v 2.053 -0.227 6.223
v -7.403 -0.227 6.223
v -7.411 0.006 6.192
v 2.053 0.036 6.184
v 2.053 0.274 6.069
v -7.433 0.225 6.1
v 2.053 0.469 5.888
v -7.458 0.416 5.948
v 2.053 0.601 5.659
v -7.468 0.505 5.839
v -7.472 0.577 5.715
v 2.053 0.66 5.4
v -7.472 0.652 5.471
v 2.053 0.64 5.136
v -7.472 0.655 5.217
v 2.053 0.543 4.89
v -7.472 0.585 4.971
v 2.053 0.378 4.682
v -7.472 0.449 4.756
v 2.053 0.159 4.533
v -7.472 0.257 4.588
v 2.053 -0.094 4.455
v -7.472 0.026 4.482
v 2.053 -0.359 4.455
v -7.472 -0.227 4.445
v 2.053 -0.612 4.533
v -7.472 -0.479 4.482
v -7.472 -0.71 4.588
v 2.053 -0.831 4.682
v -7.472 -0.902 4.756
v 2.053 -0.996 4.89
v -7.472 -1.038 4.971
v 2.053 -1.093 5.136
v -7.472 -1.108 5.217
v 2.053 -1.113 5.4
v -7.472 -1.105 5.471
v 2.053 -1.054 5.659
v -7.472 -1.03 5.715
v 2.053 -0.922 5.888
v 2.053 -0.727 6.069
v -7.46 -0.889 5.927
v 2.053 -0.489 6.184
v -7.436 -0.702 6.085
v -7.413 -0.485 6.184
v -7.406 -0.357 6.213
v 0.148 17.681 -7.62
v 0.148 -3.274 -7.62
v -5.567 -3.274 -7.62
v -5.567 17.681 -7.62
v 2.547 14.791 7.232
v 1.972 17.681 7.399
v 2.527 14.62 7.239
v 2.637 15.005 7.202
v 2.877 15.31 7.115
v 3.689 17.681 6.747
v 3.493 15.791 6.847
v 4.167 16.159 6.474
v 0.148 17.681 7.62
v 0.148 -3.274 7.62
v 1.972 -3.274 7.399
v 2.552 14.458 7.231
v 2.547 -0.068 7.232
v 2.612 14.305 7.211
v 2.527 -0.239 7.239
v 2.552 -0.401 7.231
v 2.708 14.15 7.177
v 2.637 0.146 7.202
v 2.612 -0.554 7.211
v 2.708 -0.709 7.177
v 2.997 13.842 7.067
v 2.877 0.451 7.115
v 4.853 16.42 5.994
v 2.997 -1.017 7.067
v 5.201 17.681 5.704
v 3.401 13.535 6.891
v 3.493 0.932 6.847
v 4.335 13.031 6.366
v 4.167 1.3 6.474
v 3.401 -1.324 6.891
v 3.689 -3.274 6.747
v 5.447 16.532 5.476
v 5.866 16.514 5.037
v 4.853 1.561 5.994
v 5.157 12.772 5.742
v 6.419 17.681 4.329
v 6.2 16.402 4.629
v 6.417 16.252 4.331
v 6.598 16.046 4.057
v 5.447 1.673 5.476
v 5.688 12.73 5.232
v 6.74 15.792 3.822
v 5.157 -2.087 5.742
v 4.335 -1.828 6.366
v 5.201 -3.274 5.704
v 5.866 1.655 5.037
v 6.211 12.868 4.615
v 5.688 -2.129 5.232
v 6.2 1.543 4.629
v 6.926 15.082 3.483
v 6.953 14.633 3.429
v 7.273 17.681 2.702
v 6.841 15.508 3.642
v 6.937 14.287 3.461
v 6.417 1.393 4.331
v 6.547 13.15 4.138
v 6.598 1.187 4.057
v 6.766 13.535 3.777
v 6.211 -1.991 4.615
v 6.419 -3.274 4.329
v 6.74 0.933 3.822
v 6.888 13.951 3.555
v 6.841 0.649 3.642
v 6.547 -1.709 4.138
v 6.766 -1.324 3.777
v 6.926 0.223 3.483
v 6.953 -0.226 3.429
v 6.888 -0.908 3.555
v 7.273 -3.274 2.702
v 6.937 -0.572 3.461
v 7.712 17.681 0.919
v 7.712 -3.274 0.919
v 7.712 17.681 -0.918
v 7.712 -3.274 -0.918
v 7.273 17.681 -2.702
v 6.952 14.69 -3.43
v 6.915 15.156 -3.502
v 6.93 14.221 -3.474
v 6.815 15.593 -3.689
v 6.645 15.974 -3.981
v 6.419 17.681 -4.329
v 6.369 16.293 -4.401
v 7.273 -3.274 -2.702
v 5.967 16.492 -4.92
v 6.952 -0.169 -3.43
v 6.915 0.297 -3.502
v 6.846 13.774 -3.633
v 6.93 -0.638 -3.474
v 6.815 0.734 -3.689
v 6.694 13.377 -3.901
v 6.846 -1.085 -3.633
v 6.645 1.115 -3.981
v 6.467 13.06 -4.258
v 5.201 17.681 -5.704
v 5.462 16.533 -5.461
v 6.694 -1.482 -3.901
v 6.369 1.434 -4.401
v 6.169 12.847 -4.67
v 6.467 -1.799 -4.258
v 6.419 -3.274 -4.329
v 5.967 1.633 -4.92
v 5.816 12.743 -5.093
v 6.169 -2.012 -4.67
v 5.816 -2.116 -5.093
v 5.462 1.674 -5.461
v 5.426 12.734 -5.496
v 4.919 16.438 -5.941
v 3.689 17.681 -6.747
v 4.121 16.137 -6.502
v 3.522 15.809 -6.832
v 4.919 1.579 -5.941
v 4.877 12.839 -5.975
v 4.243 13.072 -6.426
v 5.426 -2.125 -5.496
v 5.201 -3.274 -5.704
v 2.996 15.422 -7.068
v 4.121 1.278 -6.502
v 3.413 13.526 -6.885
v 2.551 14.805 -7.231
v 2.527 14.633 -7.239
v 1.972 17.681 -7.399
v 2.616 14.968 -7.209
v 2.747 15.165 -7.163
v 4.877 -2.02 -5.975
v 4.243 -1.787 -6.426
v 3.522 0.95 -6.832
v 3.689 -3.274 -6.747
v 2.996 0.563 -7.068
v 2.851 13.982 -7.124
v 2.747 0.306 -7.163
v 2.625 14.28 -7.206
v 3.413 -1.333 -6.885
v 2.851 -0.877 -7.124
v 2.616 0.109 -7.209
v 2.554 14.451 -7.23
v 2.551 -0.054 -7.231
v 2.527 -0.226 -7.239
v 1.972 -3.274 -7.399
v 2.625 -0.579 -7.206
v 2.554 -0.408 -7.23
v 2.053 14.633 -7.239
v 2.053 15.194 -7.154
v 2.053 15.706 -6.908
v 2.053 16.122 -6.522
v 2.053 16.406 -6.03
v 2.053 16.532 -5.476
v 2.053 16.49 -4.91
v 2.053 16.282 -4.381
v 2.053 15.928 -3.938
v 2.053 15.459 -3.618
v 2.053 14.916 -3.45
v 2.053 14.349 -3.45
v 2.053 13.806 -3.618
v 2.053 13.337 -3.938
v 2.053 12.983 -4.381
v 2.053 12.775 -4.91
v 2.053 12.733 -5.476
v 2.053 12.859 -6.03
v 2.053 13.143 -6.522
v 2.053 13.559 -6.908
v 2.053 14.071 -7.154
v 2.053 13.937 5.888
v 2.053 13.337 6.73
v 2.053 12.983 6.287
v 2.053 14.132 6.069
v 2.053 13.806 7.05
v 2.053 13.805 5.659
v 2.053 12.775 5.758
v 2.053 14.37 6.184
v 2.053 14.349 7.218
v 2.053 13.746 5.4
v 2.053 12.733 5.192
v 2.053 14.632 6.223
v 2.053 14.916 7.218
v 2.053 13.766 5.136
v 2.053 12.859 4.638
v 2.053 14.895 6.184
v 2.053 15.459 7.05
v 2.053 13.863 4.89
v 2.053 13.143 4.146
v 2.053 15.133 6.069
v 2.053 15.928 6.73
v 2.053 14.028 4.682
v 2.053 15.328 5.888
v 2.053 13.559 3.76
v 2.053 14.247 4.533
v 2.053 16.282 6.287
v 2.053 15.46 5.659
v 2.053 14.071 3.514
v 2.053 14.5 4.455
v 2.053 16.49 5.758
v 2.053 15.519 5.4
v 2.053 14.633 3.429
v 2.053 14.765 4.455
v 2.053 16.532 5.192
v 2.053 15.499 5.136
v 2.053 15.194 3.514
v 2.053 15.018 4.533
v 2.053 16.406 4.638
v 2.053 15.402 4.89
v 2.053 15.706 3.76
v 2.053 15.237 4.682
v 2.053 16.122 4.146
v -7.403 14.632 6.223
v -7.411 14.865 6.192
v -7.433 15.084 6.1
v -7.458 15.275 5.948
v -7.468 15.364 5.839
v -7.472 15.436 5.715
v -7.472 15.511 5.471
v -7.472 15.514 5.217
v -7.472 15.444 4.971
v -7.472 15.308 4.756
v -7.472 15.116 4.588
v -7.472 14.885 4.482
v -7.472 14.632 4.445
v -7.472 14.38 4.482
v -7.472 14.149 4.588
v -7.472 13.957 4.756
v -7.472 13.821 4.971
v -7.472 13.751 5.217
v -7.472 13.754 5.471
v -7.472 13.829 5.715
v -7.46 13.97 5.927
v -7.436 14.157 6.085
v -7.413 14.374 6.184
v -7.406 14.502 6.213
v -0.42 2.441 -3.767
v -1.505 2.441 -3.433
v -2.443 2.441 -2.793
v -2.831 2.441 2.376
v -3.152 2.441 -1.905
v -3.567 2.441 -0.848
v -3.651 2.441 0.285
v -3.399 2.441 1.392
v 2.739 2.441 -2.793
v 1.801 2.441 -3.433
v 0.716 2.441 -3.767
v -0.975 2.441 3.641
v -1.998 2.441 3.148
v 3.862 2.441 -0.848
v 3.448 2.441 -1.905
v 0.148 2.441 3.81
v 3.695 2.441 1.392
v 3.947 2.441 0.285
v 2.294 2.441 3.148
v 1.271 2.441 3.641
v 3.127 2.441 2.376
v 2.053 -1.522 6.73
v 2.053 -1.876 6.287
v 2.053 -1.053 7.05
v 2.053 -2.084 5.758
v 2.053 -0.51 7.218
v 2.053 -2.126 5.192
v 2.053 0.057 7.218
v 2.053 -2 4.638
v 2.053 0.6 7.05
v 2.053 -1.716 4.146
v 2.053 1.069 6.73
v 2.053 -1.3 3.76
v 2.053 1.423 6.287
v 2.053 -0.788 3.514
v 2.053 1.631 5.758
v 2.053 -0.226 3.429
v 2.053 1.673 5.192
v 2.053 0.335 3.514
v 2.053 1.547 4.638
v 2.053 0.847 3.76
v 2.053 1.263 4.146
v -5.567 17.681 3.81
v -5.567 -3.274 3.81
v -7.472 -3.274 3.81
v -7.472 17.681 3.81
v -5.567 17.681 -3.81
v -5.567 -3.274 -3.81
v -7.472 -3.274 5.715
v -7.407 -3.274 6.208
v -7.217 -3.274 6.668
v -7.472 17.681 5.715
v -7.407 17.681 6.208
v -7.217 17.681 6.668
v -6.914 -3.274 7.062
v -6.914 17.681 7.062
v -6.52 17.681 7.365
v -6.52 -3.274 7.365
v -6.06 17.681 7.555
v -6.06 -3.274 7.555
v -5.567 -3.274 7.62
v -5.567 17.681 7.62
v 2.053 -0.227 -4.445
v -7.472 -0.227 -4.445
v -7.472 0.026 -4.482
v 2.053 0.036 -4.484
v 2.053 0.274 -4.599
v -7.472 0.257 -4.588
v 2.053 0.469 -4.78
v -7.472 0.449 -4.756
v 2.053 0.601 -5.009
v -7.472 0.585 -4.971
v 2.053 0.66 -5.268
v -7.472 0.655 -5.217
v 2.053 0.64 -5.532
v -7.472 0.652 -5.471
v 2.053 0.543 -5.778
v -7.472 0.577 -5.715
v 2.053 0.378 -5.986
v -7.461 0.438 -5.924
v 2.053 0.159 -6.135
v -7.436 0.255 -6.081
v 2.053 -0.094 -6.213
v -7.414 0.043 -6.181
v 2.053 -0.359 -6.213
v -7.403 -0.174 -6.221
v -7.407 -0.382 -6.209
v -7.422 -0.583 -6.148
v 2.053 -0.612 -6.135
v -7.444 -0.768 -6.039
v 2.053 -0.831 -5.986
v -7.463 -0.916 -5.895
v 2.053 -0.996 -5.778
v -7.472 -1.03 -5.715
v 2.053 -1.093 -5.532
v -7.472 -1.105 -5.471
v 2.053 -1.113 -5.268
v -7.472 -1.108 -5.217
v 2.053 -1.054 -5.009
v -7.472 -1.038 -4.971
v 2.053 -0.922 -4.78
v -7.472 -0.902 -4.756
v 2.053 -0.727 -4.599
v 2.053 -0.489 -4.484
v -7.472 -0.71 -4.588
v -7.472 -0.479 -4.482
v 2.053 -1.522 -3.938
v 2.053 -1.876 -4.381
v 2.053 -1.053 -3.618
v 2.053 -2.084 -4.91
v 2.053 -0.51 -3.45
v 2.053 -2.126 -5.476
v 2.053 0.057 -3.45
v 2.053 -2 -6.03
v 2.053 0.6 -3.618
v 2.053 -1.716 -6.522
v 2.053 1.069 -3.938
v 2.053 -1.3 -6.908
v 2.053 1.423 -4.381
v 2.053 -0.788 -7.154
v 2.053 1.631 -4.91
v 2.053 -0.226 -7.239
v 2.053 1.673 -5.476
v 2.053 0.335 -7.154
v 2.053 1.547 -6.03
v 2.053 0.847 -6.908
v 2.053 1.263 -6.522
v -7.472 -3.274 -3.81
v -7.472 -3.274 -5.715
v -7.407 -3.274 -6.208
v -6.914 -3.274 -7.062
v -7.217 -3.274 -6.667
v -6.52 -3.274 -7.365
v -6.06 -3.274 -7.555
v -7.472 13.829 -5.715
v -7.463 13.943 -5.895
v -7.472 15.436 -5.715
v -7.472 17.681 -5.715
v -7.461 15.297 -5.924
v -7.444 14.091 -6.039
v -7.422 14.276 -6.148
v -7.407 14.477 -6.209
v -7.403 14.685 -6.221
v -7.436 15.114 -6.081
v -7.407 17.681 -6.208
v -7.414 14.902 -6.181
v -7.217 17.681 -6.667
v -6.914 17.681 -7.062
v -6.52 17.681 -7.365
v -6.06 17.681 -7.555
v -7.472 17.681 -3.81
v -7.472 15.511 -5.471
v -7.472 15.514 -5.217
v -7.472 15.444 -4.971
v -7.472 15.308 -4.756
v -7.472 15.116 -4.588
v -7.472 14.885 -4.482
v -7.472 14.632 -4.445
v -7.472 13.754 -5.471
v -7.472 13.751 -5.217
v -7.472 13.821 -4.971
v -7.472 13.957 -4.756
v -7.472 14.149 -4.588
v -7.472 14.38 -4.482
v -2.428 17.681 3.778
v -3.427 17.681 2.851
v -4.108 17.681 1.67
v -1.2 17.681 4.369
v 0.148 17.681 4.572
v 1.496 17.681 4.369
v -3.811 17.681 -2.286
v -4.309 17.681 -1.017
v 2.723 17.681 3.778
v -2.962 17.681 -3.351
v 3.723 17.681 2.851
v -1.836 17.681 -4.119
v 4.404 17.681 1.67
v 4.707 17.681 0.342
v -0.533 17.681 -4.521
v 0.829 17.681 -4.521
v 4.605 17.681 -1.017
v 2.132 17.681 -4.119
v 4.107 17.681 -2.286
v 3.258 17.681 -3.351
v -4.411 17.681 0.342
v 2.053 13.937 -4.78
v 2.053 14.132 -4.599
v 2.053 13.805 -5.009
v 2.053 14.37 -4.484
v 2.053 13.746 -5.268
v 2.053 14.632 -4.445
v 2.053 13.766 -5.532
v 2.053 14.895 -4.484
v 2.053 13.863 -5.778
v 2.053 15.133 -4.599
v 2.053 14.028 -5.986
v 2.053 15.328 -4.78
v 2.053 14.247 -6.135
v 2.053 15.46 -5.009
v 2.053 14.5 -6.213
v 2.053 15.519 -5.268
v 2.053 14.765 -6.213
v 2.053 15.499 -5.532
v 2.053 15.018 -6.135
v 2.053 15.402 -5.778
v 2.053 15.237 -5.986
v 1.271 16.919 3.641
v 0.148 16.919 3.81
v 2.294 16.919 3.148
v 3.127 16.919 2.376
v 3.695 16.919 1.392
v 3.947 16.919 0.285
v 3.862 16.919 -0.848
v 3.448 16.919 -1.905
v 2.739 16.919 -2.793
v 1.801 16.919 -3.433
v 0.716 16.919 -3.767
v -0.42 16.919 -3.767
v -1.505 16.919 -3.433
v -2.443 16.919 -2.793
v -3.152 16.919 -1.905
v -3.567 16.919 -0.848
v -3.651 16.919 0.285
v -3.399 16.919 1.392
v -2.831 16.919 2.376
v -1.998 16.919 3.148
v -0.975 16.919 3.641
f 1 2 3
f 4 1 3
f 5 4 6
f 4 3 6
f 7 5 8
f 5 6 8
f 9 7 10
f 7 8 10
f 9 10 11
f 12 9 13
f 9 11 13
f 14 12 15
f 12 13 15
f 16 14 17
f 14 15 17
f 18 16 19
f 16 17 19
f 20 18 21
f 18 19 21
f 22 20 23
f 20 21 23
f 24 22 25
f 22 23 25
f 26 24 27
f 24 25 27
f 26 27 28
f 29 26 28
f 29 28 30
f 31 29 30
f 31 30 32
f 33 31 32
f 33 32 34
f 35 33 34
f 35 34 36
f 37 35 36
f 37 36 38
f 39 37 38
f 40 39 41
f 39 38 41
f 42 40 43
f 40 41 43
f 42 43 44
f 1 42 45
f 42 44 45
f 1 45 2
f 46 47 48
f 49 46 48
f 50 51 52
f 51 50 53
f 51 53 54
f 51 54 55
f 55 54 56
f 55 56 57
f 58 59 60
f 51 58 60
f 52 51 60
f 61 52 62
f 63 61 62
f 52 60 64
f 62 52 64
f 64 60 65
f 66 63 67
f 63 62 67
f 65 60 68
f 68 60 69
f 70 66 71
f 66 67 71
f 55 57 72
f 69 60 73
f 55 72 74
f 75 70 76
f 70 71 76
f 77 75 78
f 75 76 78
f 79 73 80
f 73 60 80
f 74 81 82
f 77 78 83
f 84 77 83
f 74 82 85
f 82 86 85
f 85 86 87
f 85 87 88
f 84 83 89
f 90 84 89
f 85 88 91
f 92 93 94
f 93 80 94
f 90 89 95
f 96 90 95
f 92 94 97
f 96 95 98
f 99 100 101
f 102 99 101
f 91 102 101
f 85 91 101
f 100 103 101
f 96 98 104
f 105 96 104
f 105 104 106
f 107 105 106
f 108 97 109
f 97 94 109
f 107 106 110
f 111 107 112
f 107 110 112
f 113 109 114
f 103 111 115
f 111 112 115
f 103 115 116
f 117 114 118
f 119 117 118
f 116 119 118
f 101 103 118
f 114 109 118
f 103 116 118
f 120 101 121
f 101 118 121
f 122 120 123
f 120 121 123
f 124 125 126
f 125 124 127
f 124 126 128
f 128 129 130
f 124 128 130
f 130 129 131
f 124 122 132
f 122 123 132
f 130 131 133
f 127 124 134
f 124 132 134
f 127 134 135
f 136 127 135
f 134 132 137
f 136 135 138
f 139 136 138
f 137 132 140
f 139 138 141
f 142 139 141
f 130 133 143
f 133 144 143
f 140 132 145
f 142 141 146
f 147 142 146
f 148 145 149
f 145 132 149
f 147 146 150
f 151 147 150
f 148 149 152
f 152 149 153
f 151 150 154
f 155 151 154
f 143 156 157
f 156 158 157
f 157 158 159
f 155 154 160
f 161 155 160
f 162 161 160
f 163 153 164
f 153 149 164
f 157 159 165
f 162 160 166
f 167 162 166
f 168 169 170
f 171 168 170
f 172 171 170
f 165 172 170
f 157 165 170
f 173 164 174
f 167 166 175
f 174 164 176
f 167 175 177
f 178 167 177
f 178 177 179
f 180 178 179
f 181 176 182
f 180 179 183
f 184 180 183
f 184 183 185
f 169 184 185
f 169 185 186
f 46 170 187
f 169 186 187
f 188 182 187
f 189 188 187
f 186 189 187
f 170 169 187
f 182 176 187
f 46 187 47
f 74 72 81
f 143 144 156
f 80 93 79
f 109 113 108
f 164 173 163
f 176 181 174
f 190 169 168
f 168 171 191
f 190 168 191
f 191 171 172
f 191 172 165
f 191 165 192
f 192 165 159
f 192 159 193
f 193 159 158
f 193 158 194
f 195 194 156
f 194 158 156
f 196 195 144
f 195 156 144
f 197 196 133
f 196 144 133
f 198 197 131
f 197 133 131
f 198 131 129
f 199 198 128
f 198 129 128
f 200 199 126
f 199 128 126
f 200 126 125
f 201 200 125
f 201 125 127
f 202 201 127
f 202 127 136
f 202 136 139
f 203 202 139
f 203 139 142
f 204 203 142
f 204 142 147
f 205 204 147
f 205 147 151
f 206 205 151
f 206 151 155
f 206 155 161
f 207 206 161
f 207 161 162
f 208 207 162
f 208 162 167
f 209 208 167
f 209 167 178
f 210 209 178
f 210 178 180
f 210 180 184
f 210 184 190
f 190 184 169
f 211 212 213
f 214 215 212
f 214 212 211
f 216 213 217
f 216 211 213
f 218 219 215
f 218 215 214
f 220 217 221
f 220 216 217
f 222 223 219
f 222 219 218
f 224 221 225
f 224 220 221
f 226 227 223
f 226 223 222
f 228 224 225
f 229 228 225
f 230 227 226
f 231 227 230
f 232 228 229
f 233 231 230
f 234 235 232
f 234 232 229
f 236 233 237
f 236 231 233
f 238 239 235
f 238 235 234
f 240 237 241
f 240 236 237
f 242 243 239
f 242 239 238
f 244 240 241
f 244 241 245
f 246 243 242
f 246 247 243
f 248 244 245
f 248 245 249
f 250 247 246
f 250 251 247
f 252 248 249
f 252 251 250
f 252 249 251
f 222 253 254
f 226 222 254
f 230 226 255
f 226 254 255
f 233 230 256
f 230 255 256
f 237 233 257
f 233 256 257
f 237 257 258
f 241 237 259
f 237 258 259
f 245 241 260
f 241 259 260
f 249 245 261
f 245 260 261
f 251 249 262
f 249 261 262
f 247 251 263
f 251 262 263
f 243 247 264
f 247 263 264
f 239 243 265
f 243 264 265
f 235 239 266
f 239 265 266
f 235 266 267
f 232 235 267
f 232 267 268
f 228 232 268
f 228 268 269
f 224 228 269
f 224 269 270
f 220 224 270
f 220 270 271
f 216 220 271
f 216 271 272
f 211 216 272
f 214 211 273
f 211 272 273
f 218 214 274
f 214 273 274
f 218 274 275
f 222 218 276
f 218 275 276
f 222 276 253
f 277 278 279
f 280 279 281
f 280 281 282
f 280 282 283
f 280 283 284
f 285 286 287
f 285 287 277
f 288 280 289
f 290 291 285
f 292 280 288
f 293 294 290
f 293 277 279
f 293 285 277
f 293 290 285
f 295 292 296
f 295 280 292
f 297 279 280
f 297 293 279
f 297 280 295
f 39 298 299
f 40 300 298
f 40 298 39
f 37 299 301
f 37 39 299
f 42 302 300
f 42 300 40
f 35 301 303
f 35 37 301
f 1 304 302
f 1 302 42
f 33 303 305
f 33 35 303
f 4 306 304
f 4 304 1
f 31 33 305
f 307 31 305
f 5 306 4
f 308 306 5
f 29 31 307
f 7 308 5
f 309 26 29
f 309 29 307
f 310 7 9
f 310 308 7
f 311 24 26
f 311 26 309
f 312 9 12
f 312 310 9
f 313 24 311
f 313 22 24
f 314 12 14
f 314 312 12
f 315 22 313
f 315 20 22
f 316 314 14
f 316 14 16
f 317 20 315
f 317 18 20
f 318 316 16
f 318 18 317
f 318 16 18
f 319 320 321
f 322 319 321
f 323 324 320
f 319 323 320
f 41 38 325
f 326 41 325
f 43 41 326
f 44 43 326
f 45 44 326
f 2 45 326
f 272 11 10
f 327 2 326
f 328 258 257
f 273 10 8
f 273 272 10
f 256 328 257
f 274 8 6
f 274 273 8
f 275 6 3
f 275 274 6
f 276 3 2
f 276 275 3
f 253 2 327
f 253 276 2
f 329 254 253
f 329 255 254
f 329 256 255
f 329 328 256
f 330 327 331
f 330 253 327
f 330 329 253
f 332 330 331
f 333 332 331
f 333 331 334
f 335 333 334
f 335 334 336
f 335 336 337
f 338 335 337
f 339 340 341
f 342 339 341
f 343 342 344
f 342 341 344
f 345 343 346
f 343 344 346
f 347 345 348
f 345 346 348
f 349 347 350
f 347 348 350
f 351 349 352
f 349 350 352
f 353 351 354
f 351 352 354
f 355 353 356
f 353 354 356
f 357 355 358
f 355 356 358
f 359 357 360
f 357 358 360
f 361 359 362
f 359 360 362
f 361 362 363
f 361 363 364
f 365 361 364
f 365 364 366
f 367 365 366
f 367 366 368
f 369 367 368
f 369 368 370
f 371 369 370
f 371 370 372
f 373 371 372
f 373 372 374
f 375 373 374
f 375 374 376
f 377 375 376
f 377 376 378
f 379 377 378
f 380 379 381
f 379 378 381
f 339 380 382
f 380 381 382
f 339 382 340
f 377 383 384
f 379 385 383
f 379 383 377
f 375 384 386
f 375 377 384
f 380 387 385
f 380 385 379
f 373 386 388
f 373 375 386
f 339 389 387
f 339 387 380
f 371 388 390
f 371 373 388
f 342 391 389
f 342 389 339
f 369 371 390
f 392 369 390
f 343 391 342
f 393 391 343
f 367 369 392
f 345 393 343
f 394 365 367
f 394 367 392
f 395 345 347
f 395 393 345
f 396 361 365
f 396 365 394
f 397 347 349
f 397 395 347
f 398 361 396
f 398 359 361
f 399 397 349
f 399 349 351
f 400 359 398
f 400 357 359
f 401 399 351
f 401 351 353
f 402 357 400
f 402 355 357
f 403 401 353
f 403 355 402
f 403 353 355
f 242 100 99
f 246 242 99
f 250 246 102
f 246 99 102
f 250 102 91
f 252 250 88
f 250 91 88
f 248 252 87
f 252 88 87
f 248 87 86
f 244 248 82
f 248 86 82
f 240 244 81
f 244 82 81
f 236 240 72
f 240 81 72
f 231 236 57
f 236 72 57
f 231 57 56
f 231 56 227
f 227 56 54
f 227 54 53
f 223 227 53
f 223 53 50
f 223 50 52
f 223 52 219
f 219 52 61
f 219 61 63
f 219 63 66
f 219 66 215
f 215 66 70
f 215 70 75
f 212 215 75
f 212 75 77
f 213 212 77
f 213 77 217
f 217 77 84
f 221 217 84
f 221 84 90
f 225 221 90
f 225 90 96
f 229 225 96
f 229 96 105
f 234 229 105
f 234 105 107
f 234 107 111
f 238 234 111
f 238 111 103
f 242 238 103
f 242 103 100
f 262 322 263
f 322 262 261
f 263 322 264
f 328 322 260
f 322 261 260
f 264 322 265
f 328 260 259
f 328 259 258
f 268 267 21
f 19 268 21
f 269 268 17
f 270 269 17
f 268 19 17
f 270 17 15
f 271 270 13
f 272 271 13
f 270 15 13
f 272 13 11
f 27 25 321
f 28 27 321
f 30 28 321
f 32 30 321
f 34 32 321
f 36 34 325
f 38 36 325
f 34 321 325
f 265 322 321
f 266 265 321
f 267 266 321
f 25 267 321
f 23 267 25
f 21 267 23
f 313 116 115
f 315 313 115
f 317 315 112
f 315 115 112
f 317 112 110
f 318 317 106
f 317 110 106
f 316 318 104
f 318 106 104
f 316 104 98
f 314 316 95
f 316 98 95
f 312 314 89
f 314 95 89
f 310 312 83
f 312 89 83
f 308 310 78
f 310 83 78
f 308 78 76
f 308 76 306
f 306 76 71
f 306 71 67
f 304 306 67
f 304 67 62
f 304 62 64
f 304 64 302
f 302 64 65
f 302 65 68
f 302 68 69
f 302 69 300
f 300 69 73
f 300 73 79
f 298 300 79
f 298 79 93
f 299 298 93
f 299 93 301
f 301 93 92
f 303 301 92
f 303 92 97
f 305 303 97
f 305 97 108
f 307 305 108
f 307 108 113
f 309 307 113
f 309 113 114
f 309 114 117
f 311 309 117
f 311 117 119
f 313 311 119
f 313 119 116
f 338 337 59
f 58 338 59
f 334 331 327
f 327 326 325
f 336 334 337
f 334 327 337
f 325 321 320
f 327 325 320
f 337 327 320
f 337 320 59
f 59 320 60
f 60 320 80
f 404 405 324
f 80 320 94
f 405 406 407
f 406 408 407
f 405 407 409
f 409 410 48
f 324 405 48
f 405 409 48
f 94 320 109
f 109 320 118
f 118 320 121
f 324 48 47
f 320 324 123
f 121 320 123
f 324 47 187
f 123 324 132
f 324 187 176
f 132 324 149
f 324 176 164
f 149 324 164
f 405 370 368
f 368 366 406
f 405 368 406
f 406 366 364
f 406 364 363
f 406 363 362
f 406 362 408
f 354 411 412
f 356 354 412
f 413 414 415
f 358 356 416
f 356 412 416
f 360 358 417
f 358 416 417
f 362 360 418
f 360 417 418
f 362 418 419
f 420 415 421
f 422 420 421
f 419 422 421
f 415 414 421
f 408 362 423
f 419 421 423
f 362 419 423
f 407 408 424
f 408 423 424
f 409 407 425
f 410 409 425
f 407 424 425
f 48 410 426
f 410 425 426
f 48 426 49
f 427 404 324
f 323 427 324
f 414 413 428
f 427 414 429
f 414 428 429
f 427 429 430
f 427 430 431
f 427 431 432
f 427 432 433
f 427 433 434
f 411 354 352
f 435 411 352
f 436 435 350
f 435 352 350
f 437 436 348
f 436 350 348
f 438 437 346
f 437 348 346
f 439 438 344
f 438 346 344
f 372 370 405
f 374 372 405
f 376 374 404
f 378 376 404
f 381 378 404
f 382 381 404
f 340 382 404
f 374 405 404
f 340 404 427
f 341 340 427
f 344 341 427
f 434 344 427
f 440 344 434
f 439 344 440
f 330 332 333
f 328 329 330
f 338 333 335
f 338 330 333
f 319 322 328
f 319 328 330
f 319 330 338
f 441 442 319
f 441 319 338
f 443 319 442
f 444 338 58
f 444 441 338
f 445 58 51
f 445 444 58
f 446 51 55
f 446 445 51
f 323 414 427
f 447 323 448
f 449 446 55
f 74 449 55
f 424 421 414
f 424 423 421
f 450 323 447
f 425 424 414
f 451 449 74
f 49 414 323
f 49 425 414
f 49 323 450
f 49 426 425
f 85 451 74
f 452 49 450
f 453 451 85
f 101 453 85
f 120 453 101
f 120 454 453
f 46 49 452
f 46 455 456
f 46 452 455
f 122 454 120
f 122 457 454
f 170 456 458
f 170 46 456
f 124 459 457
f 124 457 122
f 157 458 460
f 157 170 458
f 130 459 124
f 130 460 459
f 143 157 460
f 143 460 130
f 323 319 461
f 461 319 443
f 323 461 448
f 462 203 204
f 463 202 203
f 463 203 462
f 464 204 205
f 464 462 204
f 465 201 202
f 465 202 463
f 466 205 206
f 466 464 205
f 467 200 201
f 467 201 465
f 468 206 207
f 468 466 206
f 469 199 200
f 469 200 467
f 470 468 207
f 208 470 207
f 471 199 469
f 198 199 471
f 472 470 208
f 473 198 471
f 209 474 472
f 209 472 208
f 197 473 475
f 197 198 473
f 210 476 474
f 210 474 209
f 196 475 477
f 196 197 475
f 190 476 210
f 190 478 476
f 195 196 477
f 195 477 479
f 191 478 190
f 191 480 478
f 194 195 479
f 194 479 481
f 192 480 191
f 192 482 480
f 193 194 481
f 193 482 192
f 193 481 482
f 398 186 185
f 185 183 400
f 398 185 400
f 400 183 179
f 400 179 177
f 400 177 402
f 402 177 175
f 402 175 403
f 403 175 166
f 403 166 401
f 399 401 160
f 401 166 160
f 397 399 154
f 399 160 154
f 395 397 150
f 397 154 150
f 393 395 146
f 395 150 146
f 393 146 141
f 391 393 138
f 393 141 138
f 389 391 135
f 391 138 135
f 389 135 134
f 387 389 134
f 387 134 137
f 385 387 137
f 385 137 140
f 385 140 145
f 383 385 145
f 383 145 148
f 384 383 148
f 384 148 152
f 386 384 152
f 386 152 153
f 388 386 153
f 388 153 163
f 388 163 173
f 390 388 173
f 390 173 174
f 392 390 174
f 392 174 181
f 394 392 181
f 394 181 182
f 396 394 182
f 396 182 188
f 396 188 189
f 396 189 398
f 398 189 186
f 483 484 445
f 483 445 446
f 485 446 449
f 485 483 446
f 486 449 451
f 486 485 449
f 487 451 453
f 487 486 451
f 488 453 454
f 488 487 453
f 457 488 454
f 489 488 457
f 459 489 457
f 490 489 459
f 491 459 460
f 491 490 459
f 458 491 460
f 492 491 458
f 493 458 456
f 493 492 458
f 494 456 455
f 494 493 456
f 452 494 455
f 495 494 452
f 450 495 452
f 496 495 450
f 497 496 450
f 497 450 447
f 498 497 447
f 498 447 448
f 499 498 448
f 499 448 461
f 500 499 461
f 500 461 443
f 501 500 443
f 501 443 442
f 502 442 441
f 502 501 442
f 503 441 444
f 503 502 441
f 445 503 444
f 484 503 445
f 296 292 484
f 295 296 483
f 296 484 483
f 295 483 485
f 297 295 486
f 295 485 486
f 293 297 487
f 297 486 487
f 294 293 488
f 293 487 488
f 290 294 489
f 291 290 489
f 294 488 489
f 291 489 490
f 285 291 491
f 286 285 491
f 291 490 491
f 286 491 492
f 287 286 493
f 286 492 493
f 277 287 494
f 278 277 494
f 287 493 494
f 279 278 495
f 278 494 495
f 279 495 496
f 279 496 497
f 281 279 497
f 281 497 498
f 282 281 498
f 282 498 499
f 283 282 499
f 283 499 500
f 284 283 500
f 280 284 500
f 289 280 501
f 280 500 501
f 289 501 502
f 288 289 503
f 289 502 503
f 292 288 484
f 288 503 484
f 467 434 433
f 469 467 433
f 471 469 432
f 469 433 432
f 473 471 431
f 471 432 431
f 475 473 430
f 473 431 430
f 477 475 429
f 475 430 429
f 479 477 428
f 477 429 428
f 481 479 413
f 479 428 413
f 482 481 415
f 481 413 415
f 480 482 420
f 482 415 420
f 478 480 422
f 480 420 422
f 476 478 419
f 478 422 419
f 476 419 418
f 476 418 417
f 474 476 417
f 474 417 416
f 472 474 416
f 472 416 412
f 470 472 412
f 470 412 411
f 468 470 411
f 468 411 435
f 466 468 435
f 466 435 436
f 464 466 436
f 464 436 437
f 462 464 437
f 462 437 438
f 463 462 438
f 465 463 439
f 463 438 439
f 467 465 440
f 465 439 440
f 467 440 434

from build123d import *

# Parameters (mm, degrees)
BOSS_EXTRUDE1_DEPTH        = 13.97
SKETCH2_R                  = 2.54
CUT_EXTRUDE1_DEPTH         = 10.16
CUT_EXTRUDE3_START         = 6.35
SKETCH4_R                  = 1.27
CUT_EXTRUDE3_DEPTH         = 5.08
FILLET2_R                  = 1.27
CHAMFER2_SIZE              = 0.508
SCALE1_SCALE               = 1.5
F_50_0_07_DIAMETER_HOLE1_D = 1.778


with BuildPart() as part:
    # Sketch1 → Boss-Extrude1 (new body)
    with BuildSketch(Plane(origin=(0, 0, 0), x_dir=(1, 0, 0), z_dir=(0, 1, 0))):
        with BuildLine():
            Line((-5.08, 2.54), (-3.81, 2.54))
            Line((-3.81, 2.54), (-3.81, -2.54))
            Line((-3.81, -2.54), (-5.08, -2.54))
            Line((-5.08, -2.54), (-5.08, -5.08))
            Line((-5.08, -5.08), (0, -5.08))
            ThreePointArc((0, -5.08), (5.08, 0), (0, 5.08))
            Line((0, 5.08), (-5.08, 5.08))
            Line((-5.08, 5.08), (-5.08, 2.54))
        make_face()
    extrude(amount=BOSS_EXTRUDE1_DEPTH)

    # Sketch2 → Cut-Extrude1 (cut)
    with BuildSketch(Plane(origin=(0, 13.97, 0), x_dir=(1, 0, 0), z_dir=(0, 1, 0))):
        with Locations(Location((0, 0, 0), (0, 0, 270))):
            Circle(SKETCH2_R)
    extrude(amount=-CUT_EXTRUDE1_DEPTH, mode=Mode.SUBTRACT)

    # Sketch4 → Cut-Extrude3 (cut)
    with BuildSketch(Plane(origin=(0, 0, 0), x_dir=(0, 0, -1), z_dir=(1, 0, 0)).offset(CUT_EXTRUDE3_START)):
        with Locations((-3.556, 2.032)):
            Circle(SKETCH4_R)
        with Locations((3.556, 2.032)):
            Circle(SKETCH4_R)
        with Locations((-3.556, 11.938)):
            Circle(SKETCH4_R)
        with Locations((3.556, 11.938)):
            Circle(SKETCH4_R)
    extrude(amount=-CUT_EXTRUDE3_DEPTH, mode=Mode.SUBTRACT)

    # Fillet2
    fillet2_edges = [part.edges().sort_by_distance(p)[0] for p in [
        (-5.08, 6.985, -5.08),
        (-5.08, 6.985, 5.08),
    ]]
    fillet(fillet2_edges, radius=FILLET2_R)

    # Chamfer2
    chamfer2_edges = [part.edges().sort_by_distance(p)[0] for p in [
        (0, 13.97, -2.54),
    ]]
    chamfer(chamfer2_edges, length=CHAMFER2_SIZE)


with BuildPart() as part_1:
    # Scale1: scaled about (-0.295942874, 6.548984476, -4.0012e-05)
    add(part.part.scale(SCALE1_SCALE).moved(Location((0.147971437, -3.274492238, 2.0006e-05))))

    # #50 (0.07) Diameter Hole1 (through all)
    with Locations(Plane(origin=(2.052964344, 0, 0), x_dir=(0, 0, -1), z_dir=(1, 0, 0))):
        with Locations((-5.334026182, -0.226506275), (5.333973818, -0.226506275), (5.333973818, 14.632493725), (-5.334026182, 14.632493725)):
            Hole(F_50_0_07_DIAMETER_HOLE1_D / 2)


solid = part_1.part
